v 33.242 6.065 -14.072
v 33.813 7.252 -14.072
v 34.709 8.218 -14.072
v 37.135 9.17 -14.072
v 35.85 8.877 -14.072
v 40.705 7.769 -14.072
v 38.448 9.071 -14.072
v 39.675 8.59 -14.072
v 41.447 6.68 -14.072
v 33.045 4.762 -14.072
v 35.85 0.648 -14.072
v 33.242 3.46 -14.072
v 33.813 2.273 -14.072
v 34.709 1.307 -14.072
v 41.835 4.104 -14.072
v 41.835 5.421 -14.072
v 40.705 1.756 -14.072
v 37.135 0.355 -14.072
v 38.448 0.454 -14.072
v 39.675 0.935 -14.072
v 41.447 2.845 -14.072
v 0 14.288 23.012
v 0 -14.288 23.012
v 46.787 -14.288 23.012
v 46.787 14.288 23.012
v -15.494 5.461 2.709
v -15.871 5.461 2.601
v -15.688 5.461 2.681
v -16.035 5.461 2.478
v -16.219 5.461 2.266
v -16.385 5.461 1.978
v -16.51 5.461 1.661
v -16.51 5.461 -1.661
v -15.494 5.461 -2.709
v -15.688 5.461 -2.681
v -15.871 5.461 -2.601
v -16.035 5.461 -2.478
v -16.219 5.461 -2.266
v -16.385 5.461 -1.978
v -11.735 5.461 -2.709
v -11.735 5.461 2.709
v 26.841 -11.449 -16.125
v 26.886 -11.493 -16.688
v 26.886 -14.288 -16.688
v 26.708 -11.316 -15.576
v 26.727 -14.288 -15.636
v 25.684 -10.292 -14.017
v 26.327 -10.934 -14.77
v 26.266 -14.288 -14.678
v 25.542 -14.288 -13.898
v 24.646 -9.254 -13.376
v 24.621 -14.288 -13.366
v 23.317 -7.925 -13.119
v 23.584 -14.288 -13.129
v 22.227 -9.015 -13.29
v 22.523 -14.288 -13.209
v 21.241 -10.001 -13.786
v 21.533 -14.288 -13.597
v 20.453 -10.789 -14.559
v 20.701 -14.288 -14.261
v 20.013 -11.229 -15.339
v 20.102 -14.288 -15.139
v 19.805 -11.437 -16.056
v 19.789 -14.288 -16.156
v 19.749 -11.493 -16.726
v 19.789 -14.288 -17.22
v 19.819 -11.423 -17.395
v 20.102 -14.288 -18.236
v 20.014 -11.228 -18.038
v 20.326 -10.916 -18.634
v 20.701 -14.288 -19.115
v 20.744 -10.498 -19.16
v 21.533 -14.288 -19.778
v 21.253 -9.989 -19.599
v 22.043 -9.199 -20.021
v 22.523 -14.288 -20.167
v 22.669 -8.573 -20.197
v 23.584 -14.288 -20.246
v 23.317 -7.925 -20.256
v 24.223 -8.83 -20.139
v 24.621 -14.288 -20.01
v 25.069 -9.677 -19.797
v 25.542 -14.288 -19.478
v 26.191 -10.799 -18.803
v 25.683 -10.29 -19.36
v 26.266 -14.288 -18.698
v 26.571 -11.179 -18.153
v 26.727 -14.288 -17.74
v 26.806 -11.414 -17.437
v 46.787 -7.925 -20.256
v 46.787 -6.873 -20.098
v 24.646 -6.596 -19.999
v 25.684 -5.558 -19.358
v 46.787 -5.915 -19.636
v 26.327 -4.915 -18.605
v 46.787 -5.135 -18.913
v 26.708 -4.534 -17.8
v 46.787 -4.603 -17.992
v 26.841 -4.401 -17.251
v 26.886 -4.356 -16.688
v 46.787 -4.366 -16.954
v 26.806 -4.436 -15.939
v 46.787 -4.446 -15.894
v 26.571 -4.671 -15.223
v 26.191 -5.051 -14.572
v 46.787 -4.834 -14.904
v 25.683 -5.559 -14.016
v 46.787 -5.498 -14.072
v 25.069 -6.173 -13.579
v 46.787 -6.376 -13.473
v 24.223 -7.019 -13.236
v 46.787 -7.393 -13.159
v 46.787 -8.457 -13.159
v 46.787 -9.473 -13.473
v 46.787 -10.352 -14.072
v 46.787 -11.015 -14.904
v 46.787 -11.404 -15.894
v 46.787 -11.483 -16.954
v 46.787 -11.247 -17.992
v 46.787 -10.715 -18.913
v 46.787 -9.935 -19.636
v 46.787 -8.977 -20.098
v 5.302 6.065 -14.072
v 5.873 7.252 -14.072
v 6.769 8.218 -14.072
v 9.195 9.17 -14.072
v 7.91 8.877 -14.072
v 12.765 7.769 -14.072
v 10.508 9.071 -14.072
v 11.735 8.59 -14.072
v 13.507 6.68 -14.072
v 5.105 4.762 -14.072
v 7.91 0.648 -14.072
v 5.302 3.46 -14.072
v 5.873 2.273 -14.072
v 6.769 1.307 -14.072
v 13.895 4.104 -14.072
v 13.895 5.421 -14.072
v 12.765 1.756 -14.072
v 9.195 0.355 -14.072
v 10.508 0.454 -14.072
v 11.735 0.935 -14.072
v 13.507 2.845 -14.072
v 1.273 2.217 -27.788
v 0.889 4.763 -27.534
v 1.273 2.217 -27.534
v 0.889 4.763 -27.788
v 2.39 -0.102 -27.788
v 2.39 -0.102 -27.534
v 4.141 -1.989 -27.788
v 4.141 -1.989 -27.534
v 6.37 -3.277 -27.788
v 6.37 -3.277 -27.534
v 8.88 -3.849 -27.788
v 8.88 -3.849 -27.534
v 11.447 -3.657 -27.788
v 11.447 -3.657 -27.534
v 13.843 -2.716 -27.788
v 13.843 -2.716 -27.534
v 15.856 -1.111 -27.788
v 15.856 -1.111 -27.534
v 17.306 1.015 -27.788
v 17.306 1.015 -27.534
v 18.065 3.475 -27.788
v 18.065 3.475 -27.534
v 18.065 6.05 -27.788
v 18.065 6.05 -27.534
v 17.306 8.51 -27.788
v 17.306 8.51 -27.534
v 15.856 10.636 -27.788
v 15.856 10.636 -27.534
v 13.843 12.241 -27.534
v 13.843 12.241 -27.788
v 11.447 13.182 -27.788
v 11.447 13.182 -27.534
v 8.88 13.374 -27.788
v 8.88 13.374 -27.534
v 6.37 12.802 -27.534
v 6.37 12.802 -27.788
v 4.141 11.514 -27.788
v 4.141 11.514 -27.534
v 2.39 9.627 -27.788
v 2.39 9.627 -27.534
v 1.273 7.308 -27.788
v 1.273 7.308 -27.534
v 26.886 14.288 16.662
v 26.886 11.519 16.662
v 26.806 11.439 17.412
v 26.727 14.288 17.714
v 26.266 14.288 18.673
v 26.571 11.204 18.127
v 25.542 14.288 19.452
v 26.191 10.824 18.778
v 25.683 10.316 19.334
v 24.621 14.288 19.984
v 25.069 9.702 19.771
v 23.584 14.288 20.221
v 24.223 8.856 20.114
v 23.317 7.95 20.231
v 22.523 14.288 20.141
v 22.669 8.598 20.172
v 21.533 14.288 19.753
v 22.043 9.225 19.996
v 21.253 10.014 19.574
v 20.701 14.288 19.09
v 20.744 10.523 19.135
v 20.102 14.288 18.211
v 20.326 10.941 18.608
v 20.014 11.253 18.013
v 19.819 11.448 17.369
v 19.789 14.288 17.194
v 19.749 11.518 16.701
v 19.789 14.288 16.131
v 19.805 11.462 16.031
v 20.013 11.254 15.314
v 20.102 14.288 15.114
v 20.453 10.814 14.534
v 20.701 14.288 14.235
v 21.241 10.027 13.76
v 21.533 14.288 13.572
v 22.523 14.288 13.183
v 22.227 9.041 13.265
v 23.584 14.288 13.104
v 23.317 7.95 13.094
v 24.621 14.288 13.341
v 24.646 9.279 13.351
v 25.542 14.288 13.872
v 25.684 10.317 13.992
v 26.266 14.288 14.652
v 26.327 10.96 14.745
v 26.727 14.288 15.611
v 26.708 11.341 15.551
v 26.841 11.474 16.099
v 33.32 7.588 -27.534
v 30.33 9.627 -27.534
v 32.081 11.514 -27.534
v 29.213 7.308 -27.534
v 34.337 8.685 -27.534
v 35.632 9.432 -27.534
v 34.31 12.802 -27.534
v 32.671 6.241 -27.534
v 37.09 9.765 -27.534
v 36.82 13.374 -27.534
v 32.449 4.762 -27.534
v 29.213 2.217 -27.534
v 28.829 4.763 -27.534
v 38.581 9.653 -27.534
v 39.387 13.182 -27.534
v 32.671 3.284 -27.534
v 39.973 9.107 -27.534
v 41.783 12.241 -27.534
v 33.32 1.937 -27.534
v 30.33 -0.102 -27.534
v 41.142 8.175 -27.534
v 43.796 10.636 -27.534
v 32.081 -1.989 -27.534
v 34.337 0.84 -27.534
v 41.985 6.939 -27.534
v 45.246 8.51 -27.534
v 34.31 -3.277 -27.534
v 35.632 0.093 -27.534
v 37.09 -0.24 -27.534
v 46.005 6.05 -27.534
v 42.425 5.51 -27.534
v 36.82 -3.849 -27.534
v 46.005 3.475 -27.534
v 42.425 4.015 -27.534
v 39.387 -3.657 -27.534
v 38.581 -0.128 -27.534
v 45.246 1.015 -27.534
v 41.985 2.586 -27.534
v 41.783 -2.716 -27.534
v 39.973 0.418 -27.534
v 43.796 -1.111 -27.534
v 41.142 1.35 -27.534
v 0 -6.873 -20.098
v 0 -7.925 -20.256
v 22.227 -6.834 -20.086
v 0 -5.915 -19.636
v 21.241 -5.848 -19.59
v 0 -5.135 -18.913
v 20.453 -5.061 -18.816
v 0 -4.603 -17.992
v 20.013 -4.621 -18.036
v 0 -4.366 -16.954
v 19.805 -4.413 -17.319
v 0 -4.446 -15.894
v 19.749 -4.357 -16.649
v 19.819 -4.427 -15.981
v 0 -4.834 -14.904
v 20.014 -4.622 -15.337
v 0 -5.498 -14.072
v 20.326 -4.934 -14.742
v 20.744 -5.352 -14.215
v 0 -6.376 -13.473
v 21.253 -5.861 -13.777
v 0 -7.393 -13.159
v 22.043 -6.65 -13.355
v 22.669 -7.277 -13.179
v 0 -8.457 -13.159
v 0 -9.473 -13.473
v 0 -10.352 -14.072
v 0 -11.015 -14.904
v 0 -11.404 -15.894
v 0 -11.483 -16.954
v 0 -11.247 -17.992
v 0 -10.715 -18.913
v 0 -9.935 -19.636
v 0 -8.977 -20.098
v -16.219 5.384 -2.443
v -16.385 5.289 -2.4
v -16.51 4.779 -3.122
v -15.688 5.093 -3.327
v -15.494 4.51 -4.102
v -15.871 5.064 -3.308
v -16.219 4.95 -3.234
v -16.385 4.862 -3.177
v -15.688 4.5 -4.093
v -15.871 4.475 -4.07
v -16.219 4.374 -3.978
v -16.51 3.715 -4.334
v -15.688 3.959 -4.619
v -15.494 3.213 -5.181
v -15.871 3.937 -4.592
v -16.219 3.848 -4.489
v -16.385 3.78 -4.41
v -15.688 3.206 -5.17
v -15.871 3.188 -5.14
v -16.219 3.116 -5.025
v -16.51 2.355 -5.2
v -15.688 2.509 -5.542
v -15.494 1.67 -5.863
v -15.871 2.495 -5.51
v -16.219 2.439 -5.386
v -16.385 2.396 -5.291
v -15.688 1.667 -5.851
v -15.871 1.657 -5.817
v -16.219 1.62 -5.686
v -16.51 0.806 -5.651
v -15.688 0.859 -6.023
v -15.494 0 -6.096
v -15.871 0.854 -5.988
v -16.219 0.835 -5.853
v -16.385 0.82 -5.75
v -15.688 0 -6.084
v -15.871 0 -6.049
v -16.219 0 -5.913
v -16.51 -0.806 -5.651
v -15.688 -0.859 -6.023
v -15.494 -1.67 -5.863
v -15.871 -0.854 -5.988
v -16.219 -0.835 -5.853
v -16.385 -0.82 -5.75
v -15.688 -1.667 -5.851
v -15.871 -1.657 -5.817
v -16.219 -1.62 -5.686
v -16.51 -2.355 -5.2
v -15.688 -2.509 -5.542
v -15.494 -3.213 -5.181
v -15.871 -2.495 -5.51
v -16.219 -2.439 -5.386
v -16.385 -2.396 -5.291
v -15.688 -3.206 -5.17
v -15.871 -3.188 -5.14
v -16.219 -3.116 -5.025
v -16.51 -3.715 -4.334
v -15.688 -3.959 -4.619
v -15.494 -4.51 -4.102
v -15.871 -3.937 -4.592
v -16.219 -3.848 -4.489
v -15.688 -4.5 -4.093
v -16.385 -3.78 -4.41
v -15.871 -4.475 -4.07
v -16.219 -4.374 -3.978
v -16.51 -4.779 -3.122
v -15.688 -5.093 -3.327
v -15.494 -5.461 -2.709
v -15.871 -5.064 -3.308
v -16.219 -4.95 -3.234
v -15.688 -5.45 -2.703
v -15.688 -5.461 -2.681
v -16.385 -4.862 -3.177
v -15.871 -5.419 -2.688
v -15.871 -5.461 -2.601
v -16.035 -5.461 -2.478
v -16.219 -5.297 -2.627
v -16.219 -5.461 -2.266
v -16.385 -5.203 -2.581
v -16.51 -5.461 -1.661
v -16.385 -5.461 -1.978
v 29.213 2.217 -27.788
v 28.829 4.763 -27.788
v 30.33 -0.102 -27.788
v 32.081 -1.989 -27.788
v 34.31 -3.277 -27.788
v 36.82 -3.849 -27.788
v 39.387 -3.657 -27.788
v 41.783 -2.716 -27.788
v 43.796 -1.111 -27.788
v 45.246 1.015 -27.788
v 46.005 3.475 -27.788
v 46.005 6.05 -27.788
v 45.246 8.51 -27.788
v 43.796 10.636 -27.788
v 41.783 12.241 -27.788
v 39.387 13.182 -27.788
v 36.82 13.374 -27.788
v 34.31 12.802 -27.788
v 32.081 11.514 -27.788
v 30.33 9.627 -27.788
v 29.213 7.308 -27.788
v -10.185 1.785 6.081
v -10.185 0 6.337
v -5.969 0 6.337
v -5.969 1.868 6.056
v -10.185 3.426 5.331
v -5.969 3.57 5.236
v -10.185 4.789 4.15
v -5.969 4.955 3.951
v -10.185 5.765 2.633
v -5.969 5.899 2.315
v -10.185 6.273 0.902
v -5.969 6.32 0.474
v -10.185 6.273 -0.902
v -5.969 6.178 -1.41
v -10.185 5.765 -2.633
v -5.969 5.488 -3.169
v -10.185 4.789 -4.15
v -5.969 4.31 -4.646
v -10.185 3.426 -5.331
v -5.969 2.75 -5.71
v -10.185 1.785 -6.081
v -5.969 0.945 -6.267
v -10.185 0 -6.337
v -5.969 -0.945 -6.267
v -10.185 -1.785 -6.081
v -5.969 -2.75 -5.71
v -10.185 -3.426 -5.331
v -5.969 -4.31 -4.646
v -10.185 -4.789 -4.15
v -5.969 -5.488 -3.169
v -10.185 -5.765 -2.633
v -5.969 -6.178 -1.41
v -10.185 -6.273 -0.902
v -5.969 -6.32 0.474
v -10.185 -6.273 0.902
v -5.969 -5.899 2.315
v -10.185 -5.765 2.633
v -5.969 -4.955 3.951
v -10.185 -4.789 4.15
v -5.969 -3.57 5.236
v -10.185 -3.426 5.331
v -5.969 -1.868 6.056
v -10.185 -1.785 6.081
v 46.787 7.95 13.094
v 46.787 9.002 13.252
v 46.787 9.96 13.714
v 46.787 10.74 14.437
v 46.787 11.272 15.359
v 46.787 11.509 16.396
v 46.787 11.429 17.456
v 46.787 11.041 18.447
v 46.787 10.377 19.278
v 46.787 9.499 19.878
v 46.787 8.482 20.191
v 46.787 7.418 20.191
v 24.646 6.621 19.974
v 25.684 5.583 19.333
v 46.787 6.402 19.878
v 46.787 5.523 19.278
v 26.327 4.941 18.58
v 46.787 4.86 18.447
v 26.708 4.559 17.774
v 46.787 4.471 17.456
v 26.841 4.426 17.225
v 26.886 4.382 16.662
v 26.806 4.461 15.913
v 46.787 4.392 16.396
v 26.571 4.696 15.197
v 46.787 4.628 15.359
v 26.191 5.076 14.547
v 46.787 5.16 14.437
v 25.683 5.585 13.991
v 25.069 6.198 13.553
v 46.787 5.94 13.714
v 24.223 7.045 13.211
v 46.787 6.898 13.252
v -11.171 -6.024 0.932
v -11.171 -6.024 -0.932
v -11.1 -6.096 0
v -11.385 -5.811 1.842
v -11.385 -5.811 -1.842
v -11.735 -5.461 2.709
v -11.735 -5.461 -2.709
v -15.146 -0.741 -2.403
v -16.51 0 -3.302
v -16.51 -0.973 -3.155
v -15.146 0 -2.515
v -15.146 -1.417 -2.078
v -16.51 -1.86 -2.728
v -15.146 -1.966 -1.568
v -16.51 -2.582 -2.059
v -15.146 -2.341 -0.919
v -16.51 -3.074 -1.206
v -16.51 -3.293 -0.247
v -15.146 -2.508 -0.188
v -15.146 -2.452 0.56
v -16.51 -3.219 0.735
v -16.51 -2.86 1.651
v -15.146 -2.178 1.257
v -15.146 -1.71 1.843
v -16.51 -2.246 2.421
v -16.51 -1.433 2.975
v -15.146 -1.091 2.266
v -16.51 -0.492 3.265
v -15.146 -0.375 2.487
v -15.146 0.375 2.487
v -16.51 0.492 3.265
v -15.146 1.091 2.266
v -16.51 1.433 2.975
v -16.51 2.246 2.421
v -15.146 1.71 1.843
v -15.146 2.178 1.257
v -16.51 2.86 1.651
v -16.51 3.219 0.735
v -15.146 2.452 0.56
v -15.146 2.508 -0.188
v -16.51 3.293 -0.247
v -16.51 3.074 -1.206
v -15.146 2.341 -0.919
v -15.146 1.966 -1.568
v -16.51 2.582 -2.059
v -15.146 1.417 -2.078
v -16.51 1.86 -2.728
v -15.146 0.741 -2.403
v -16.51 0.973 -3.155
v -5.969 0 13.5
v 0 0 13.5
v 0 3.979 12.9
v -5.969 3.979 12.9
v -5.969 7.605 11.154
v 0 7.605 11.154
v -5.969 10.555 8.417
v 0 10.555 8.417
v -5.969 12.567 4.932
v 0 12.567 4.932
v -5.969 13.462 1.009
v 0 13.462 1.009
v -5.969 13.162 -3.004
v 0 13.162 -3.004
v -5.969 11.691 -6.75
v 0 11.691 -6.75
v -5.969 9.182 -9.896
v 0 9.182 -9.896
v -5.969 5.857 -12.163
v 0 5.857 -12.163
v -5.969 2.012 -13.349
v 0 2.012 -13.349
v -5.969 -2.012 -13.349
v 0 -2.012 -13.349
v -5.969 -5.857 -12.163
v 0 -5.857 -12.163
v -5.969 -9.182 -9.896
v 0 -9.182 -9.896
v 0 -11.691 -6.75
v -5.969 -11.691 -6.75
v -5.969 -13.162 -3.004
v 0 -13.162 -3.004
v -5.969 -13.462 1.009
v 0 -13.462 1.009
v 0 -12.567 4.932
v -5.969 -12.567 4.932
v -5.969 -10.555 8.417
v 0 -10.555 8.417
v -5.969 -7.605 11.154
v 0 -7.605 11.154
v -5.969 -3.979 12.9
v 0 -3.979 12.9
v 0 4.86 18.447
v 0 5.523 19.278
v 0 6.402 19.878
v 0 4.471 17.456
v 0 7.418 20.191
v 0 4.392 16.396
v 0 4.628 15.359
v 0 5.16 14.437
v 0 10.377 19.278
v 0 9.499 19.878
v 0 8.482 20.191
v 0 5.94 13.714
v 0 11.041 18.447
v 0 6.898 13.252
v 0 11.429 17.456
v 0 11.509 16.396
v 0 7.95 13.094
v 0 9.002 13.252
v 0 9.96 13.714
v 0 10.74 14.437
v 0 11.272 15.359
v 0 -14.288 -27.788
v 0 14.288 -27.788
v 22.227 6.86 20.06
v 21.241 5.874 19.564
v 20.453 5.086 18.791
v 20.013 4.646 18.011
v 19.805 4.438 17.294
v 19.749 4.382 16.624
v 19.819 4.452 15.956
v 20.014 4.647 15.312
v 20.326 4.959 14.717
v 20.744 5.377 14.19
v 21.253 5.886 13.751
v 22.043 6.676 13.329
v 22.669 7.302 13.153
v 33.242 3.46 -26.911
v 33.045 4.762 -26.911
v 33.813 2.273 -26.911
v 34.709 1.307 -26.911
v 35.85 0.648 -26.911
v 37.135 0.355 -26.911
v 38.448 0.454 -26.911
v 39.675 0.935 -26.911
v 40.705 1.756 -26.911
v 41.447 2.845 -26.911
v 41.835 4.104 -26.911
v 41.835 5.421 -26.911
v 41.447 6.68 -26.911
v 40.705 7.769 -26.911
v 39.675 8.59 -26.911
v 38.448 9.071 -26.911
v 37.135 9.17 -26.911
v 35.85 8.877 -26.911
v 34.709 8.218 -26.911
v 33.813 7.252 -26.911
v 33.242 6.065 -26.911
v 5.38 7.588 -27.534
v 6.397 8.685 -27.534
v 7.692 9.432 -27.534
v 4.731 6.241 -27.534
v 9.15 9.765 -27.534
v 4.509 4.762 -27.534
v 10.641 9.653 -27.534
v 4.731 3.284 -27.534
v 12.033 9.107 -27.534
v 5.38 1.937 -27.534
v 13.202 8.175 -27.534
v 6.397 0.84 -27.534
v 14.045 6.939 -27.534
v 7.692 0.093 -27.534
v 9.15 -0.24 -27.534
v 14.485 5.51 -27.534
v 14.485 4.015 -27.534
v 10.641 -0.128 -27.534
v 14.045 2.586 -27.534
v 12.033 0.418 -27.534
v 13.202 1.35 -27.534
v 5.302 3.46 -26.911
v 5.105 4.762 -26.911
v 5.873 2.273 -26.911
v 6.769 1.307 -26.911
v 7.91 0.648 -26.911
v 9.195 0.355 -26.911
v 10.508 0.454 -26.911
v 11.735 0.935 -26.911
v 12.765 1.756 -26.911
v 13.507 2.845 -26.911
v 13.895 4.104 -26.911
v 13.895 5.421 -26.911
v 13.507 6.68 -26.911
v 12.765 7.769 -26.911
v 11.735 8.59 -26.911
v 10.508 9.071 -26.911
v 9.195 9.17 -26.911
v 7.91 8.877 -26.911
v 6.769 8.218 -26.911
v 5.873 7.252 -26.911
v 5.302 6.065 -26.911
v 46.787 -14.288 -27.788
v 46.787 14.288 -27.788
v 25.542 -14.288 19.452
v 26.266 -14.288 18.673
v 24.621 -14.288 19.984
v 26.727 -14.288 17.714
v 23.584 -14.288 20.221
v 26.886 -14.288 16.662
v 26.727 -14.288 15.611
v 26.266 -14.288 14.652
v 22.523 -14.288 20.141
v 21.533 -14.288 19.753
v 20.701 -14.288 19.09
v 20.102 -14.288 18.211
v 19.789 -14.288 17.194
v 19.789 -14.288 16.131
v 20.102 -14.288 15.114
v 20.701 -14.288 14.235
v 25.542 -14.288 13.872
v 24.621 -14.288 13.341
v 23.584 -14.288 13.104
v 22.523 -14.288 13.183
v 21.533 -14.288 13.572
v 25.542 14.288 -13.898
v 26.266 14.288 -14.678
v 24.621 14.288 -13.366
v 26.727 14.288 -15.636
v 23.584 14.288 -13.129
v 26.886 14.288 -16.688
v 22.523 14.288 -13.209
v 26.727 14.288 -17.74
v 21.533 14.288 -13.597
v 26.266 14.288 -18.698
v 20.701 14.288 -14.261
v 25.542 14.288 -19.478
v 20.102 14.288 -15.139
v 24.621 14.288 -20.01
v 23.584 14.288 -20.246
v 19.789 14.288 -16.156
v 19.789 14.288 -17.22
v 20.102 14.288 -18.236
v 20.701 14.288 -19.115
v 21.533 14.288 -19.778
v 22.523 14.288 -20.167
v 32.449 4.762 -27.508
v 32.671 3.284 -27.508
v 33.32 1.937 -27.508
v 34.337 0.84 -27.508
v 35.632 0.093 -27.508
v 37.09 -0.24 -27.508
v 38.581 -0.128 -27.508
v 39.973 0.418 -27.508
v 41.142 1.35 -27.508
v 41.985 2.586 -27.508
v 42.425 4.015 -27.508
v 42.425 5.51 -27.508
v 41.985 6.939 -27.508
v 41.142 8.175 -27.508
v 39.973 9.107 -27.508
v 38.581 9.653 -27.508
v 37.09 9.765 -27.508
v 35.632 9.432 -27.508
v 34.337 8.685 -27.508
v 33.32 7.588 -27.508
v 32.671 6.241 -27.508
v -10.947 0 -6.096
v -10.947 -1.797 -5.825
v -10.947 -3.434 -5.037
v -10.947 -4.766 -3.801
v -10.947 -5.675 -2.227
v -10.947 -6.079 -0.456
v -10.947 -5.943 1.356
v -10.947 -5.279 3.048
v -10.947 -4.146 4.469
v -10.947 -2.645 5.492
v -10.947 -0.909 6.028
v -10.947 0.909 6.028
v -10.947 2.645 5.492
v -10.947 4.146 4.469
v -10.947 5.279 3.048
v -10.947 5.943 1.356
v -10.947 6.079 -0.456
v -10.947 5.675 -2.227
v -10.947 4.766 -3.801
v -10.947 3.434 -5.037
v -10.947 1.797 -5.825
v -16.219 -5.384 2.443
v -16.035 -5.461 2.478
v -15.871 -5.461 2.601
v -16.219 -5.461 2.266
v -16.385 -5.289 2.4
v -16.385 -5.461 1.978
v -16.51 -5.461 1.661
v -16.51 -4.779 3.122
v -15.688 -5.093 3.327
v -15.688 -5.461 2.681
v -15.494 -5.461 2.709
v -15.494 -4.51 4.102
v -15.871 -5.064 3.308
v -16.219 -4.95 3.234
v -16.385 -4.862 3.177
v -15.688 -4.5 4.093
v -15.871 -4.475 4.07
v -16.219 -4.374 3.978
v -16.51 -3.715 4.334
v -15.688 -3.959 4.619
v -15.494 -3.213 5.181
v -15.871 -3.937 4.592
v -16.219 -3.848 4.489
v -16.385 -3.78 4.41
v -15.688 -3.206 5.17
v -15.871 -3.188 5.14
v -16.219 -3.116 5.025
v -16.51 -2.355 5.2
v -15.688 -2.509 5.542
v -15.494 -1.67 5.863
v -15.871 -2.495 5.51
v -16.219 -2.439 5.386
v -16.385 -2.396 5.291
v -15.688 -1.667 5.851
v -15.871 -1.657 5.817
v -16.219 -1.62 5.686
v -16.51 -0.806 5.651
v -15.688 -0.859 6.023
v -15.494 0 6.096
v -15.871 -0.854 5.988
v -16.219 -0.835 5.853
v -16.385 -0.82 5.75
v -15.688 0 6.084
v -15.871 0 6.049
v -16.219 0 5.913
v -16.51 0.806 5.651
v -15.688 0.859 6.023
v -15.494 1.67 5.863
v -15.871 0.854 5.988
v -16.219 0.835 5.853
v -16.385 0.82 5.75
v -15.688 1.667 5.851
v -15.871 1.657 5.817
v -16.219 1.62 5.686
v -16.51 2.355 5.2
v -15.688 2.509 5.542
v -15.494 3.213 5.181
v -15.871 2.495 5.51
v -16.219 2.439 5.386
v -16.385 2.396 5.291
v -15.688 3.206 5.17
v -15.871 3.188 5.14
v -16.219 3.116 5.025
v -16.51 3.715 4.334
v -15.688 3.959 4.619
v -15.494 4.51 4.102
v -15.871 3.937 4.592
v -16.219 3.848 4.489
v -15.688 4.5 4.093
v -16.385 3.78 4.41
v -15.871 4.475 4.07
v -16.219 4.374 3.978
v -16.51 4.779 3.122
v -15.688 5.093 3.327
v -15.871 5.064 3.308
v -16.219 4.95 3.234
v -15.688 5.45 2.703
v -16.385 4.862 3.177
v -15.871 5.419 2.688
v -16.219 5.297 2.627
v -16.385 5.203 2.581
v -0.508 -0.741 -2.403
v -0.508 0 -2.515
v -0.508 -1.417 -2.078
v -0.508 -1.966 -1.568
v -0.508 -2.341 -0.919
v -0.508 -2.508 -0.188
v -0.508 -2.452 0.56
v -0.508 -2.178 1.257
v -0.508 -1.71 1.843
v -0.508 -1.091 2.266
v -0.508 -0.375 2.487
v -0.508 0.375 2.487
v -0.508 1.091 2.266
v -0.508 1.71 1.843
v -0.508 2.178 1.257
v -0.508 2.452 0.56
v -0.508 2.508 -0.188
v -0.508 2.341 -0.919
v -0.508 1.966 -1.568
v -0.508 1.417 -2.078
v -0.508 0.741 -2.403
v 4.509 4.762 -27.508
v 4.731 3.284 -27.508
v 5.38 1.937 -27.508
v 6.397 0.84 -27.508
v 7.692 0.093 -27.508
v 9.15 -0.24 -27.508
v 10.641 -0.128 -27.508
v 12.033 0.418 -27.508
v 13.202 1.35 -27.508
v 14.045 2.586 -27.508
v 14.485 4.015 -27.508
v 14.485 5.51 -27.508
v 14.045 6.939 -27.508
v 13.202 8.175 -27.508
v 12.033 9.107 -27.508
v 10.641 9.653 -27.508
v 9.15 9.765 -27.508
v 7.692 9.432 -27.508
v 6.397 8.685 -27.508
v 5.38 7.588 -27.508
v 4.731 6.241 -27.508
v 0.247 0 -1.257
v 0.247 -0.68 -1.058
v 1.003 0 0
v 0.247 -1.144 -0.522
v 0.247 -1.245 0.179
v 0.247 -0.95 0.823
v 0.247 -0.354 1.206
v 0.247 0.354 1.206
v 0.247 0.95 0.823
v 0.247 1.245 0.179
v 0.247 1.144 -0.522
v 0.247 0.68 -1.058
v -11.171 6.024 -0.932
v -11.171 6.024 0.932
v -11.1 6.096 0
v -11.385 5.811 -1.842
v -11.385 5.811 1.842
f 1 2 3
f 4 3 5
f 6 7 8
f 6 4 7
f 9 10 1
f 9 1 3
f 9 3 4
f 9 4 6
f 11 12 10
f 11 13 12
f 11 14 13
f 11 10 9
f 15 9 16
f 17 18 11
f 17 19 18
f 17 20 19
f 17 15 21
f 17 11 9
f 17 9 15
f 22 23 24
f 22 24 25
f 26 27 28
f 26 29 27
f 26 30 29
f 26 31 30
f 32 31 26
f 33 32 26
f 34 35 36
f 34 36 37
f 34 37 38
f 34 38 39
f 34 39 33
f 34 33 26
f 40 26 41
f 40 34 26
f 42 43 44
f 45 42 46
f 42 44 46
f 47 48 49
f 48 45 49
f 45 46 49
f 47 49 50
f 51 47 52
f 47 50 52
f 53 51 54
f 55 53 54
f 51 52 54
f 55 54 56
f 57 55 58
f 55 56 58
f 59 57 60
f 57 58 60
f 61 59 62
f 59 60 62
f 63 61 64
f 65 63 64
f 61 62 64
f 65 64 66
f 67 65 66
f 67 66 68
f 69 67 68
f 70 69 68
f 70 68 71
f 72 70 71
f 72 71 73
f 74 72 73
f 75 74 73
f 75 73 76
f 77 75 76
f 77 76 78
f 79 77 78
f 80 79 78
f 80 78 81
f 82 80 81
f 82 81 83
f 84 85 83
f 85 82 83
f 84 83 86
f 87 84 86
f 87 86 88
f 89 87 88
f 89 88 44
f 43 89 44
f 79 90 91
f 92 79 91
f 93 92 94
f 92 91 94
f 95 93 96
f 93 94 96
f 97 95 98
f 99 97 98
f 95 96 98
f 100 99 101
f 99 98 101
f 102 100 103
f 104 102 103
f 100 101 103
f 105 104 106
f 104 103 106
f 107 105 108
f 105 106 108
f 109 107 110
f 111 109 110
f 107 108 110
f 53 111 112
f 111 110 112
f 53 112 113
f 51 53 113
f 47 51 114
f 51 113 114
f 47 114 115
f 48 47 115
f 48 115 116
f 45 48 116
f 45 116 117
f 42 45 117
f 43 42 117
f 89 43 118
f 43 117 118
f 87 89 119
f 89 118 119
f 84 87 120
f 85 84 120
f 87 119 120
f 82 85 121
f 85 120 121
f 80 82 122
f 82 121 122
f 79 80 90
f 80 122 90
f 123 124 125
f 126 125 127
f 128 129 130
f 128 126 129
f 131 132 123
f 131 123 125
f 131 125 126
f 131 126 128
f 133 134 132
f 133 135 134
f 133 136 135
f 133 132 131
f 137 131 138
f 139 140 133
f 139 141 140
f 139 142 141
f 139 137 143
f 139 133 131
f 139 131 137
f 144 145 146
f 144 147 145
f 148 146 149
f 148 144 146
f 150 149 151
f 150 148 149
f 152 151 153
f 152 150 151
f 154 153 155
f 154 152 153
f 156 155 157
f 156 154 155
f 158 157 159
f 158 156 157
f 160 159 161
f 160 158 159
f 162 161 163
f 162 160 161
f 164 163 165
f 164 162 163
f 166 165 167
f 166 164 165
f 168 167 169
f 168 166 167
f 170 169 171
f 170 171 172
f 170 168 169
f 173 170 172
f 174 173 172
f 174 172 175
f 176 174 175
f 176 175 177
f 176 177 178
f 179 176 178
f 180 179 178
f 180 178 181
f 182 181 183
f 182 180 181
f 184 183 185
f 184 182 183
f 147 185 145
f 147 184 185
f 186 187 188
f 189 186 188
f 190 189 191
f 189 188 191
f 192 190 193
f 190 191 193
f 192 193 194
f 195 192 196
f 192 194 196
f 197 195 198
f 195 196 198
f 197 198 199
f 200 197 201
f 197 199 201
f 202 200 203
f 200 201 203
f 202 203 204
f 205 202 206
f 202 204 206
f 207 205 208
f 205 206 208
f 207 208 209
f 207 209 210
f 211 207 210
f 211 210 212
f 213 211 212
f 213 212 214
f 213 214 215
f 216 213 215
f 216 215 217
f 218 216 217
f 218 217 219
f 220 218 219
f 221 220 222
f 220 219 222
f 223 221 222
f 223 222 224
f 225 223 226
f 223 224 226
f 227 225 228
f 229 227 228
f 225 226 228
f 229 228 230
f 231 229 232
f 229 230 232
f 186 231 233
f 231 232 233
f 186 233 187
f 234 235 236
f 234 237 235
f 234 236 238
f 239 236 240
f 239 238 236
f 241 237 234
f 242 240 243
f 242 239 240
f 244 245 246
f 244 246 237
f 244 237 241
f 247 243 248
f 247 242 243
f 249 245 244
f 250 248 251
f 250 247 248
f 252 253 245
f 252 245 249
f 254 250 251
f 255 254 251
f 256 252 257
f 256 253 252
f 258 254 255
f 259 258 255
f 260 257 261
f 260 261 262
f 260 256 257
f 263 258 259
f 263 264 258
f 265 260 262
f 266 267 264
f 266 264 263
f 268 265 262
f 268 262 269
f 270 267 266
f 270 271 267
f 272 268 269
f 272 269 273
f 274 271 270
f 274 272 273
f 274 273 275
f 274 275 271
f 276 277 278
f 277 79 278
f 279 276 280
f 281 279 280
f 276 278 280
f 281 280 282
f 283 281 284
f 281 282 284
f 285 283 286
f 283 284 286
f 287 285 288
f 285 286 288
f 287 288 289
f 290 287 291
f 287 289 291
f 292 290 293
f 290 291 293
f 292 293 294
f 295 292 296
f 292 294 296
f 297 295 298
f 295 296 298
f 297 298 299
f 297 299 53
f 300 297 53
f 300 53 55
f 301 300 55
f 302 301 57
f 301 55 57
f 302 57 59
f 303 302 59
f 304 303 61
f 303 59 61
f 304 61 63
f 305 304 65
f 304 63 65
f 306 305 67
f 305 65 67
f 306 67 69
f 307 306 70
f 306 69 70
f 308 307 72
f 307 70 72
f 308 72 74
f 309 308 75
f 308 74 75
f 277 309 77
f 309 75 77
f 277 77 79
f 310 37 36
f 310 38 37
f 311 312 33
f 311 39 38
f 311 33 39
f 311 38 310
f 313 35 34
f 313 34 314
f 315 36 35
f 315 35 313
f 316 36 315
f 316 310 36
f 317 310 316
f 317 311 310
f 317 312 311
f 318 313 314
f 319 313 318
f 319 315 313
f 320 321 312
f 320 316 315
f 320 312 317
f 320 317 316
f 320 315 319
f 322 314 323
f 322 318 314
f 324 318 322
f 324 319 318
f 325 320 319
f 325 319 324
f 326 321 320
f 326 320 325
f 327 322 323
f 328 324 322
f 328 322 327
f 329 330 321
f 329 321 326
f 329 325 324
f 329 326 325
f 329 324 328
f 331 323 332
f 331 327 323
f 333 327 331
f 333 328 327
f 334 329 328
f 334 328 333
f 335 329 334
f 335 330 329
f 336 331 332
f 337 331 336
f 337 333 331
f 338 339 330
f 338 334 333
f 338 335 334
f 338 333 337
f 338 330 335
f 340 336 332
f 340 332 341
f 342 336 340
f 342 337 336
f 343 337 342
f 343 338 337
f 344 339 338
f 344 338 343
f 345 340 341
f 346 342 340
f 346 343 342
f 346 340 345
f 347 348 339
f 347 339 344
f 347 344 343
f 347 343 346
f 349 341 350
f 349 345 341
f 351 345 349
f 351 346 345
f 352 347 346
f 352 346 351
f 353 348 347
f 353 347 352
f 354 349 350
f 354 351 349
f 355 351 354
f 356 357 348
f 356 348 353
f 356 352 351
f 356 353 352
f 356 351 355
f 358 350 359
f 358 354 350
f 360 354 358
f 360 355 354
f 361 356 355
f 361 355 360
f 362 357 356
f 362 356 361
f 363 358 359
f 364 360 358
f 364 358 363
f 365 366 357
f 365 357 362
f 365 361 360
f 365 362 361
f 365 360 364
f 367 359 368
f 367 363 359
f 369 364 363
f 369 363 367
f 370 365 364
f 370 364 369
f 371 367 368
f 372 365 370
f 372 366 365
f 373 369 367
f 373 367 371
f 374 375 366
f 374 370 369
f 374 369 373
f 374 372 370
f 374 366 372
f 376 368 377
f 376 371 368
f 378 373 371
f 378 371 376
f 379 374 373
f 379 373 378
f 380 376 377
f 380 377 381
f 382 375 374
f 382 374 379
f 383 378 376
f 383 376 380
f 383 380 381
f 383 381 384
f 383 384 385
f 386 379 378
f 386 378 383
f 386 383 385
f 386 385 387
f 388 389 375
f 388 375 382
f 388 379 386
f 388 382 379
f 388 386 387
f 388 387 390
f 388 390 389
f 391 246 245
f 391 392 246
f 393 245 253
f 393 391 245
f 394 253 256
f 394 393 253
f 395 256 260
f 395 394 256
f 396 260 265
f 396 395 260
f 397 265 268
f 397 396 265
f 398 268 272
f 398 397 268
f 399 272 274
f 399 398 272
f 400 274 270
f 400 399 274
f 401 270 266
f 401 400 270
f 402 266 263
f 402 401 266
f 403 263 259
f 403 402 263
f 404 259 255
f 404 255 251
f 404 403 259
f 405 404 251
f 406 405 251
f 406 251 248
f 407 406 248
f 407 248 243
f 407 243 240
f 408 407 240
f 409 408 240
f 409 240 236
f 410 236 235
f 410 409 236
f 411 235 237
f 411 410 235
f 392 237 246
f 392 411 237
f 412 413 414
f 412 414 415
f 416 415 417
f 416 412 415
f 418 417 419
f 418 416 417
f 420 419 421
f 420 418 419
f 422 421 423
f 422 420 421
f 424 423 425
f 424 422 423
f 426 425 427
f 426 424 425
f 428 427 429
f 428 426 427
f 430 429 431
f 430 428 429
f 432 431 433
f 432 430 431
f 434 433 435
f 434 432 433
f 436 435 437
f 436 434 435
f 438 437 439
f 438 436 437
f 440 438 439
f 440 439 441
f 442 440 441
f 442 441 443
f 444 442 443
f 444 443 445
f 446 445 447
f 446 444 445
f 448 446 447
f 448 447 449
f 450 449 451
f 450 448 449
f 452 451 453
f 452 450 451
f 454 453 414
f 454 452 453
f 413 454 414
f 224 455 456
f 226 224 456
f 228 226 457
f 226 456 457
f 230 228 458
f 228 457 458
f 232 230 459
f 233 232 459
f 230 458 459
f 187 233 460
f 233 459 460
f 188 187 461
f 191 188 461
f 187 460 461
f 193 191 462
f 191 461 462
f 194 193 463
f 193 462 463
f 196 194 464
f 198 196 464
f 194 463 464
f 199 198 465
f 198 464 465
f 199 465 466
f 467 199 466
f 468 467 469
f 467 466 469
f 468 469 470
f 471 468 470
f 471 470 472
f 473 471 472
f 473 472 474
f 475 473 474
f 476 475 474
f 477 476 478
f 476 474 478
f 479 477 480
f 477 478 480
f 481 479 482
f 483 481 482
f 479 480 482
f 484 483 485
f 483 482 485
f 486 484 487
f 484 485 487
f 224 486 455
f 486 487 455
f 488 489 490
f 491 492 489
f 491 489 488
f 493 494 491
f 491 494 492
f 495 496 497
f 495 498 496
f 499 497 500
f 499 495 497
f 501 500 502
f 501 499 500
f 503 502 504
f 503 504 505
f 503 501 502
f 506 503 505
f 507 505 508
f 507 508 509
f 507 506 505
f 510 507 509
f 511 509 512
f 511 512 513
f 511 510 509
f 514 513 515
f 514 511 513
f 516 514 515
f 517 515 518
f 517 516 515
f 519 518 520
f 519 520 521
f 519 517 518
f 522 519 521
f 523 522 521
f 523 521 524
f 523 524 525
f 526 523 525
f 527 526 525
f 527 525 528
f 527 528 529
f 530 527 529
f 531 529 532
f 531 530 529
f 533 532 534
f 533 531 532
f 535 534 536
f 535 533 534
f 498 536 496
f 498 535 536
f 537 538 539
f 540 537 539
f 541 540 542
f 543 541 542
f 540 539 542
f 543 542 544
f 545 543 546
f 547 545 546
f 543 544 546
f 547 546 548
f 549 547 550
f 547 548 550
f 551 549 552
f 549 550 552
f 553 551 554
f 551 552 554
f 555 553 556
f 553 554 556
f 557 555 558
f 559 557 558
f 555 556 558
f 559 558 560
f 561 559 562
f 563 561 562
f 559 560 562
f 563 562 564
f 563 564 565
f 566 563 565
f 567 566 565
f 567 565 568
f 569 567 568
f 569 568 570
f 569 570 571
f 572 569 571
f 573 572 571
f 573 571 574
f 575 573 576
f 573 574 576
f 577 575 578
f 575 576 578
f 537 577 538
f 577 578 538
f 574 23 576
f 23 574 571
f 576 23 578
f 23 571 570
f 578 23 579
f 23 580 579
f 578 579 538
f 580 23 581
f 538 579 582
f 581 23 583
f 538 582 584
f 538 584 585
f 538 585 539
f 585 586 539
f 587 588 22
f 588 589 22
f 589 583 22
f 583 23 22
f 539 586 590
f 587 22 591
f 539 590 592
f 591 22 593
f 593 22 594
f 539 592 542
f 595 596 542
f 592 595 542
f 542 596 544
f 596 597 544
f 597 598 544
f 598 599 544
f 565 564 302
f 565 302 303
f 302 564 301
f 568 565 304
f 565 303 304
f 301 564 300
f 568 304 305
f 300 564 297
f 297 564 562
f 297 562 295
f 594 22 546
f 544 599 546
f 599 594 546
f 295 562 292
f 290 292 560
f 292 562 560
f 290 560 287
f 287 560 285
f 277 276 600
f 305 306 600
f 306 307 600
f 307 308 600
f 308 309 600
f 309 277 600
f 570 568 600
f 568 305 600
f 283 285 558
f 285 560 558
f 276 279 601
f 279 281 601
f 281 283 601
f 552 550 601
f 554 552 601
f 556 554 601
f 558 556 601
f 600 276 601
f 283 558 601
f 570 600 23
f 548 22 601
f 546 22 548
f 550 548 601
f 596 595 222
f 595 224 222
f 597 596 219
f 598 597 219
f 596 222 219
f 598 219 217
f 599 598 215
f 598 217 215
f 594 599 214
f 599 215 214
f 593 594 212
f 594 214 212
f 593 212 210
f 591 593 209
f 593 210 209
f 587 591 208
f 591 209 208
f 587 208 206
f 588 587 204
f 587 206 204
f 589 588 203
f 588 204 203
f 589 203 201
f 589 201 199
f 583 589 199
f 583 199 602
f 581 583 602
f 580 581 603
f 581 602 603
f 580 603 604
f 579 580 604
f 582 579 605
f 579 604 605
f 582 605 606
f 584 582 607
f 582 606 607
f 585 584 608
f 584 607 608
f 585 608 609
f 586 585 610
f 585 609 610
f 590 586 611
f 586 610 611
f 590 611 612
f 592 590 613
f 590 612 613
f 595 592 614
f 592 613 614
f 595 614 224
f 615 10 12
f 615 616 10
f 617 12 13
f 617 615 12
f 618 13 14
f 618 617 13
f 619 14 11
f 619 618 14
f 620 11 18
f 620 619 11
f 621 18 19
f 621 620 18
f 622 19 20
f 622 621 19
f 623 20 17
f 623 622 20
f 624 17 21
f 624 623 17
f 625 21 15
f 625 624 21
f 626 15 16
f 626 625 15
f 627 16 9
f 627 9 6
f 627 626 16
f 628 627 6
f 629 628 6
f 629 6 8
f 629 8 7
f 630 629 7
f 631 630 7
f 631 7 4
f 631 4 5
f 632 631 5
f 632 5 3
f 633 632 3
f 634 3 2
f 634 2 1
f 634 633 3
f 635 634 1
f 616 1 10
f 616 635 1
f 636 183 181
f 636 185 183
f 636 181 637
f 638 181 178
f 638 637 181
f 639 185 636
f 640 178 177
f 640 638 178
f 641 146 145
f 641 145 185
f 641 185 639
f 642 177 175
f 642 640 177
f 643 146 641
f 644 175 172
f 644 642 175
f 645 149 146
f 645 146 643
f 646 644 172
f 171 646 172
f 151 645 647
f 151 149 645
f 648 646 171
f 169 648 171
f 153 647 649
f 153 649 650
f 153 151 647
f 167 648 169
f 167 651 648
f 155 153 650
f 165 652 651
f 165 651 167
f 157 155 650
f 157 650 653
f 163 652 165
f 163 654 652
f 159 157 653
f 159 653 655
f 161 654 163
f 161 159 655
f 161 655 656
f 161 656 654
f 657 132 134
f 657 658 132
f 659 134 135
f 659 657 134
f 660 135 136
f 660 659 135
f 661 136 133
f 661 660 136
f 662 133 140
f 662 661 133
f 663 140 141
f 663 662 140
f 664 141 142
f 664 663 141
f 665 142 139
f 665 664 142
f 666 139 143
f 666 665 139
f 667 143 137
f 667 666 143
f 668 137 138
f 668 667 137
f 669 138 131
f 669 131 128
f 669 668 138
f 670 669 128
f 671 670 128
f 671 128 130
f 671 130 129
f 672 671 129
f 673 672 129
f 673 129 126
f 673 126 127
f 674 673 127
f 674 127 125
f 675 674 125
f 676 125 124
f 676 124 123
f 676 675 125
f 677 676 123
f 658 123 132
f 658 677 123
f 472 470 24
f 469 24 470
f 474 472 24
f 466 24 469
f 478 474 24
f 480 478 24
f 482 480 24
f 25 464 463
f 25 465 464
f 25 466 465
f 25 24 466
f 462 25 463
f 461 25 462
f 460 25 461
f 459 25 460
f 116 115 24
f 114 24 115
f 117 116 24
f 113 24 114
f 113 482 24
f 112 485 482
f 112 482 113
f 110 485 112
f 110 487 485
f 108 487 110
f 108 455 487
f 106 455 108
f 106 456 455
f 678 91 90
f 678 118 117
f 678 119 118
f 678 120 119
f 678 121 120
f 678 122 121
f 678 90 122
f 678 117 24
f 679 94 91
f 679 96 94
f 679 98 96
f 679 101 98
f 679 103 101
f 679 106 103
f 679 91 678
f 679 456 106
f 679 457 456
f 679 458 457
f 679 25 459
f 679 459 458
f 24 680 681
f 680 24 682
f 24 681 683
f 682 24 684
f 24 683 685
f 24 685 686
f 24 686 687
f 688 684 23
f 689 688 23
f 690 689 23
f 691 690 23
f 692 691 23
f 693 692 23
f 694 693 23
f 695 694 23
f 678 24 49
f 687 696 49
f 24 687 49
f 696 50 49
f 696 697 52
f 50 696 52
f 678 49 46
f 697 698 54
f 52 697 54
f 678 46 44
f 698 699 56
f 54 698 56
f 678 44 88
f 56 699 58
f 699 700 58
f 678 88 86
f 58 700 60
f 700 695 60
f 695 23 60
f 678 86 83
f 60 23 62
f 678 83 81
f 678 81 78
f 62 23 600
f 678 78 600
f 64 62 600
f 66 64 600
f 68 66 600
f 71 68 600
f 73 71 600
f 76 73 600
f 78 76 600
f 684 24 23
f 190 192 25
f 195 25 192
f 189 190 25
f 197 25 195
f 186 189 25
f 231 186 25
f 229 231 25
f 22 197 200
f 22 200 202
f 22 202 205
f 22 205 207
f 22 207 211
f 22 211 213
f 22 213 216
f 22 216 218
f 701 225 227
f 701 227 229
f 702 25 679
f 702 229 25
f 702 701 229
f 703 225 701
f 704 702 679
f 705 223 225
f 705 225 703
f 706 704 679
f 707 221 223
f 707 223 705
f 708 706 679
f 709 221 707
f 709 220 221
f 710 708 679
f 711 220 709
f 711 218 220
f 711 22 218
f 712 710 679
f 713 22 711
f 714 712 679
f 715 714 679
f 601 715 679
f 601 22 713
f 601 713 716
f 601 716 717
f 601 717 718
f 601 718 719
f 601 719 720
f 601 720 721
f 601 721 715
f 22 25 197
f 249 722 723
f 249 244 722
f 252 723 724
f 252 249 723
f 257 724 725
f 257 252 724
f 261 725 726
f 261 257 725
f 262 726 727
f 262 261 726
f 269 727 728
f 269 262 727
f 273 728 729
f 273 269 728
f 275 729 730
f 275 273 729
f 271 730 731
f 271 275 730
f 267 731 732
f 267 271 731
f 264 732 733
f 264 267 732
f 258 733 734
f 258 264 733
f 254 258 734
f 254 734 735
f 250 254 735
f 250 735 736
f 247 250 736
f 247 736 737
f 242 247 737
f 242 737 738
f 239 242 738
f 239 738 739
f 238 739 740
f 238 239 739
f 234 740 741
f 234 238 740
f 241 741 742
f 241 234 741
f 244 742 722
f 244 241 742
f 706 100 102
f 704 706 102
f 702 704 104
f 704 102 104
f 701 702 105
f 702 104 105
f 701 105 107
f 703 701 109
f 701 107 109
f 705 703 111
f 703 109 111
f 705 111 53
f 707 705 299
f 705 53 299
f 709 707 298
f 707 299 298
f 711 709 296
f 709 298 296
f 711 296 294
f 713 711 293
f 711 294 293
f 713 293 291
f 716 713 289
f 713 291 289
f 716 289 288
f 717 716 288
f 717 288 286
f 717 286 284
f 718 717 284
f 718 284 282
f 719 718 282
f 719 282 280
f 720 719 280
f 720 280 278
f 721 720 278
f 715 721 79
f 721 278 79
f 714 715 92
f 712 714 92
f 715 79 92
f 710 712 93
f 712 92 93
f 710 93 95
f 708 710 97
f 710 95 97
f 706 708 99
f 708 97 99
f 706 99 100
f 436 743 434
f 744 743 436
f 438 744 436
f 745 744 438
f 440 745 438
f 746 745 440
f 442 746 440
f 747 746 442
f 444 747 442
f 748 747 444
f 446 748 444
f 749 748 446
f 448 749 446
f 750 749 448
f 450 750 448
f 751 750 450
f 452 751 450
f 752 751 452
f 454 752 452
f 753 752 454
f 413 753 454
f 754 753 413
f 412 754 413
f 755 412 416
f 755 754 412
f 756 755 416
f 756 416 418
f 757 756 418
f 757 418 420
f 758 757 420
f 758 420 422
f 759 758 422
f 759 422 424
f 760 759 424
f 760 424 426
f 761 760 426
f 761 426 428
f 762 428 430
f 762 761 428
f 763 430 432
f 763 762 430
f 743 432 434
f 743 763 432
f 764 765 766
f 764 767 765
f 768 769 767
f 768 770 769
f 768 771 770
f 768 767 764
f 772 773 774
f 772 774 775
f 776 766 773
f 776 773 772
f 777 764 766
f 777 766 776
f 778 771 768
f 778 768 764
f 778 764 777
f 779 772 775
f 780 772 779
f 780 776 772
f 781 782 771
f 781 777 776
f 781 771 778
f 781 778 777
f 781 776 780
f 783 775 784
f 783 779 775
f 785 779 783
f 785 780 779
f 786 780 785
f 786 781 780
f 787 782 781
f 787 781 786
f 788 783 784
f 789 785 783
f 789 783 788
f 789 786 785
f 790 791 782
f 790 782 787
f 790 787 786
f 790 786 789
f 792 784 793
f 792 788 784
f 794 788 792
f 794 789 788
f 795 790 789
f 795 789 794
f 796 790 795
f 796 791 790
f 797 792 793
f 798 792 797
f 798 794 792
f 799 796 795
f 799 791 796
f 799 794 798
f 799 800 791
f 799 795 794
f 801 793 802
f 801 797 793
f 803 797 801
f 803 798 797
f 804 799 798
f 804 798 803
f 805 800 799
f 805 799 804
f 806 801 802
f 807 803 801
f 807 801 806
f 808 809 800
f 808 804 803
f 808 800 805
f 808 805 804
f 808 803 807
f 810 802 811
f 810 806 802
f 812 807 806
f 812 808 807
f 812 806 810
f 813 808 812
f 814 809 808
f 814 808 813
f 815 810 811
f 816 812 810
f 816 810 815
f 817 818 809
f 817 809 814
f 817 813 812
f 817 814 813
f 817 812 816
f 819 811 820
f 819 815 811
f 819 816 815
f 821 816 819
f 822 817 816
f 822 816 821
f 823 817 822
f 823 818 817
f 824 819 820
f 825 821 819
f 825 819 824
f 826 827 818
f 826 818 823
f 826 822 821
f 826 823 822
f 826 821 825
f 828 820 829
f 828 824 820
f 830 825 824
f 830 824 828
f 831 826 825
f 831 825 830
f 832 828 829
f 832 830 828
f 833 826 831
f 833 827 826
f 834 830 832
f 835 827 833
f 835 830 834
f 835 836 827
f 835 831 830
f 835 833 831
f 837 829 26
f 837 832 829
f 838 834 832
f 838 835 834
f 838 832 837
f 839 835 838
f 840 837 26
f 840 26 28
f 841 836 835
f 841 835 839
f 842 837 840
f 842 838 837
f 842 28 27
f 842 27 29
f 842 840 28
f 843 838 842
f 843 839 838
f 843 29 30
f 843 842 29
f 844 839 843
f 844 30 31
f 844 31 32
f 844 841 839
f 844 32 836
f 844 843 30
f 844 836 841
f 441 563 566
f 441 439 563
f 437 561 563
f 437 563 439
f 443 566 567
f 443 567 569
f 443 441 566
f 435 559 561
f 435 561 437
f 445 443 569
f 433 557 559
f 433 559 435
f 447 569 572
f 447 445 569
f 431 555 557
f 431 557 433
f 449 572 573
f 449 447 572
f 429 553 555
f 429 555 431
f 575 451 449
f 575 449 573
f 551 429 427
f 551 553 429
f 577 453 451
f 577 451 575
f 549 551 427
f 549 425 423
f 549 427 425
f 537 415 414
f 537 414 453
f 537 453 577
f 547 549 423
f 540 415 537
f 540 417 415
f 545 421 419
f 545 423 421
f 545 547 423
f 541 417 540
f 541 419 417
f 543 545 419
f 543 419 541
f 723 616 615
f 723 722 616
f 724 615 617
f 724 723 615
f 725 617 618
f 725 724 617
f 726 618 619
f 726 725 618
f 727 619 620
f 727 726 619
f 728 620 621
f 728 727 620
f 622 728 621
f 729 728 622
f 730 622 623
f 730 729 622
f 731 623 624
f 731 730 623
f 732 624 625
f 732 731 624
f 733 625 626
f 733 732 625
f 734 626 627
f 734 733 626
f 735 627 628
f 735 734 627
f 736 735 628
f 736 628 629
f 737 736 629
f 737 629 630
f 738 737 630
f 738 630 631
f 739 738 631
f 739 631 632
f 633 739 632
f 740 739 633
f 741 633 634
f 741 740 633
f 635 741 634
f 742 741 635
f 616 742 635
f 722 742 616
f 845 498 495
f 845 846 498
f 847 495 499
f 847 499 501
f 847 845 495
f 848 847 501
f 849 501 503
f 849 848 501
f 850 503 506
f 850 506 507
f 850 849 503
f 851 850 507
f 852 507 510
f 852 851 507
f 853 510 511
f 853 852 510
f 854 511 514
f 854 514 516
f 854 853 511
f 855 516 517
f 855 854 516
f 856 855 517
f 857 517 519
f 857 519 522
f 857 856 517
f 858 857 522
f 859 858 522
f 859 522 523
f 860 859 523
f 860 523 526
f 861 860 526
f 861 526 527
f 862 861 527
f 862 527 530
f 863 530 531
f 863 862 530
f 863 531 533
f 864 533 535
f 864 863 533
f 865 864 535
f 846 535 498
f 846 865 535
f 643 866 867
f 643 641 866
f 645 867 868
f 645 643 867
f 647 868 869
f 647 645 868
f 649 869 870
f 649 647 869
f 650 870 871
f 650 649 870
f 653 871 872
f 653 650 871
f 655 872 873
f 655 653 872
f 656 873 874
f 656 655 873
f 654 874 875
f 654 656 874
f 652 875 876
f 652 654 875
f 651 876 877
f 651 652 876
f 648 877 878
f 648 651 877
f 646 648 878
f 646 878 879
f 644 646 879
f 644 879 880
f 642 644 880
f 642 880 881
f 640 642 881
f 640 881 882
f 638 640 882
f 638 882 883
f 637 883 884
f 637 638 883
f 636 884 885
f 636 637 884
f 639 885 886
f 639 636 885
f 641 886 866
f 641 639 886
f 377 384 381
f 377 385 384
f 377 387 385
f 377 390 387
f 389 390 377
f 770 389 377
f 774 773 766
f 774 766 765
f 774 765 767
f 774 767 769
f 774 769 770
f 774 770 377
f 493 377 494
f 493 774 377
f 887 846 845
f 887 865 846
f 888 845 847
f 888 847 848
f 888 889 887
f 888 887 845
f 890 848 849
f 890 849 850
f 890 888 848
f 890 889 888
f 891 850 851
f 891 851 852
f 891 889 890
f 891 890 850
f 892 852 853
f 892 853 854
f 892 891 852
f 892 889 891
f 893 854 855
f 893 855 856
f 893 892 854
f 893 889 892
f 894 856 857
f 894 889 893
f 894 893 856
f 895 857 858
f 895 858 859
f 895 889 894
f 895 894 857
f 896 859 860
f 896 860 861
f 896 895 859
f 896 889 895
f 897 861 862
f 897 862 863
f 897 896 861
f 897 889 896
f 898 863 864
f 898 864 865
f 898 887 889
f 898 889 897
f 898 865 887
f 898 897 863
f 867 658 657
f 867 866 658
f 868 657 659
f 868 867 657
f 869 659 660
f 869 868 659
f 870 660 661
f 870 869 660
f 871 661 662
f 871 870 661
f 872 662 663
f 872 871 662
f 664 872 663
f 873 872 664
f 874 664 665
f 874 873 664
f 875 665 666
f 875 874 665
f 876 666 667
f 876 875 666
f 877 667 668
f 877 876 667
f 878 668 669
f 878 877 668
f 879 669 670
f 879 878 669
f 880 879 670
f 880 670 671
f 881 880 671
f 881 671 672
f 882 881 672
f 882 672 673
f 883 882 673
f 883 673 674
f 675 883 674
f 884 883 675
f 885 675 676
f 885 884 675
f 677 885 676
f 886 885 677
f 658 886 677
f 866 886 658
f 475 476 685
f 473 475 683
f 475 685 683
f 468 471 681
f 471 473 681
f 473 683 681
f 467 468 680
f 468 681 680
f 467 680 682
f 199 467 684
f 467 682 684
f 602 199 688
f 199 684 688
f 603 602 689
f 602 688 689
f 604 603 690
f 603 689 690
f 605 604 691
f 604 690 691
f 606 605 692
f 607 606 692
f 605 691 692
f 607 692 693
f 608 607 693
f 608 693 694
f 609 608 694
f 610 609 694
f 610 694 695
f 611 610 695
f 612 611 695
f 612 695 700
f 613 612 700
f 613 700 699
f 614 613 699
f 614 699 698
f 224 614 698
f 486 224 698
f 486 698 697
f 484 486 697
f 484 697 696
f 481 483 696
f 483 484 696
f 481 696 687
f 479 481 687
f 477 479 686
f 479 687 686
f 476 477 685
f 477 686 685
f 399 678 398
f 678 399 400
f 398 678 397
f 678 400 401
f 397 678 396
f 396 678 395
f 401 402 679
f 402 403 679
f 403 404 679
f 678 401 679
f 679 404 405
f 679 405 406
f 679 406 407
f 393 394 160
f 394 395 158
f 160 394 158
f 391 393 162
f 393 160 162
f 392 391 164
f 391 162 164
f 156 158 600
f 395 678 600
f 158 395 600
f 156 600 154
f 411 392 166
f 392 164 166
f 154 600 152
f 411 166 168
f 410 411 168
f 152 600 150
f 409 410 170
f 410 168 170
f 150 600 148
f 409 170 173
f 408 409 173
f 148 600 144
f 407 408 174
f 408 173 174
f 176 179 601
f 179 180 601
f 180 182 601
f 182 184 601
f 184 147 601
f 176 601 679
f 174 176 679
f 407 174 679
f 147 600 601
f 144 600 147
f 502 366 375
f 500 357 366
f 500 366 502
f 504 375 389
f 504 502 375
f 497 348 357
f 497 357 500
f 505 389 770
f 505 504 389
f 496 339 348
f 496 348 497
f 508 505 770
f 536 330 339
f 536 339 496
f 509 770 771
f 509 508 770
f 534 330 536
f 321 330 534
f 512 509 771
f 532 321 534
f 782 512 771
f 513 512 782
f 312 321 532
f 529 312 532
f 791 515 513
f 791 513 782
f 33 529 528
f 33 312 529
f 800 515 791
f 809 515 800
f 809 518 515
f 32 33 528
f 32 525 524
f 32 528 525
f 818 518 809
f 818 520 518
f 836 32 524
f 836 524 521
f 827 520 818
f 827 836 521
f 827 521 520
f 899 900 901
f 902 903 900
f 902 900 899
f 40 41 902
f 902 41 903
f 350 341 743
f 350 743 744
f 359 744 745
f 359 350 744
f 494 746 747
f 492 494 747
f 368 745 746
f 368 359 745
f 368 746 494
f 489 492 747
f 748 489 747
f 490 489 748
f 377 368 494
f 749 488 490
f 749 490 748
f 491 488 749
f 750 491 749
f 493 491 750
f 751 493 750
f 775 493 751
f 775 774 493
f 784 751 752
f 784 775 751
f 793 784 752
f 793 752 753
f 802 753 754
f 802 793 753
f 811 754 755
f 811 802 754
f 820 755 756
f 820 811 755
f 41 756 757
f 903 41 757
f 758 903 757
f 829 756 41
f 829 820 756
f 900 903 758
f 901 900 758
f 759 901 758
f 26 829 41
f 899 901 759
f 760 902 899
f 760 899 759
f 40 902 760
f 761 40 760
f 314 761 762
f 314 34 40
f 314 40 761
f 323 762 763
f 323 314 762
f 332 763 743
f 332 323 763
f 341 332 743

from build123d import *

# Parameters (mm, degrees)
SKETCH1_W          = 50.8
SKETCH1_H          = 28.575
EXTRUDE1_DEPTH     = 46.7868
LPATTERN1_COUNT    = 2
LPATTERN1_PITCH    = 27.94
SKETCH5_R          = 13.5001
EXTRUDE2_DEPTH     = 5.969
SKETCH6_W          = 6.3373
SKETCH6_H          = 10.541
CUT_EXTRUDE4_DEPTH = 30.48
HOLE1_D            = 7.137
HOLE1_DEPTH        = 46.7868
HOLE2_D            = 7.137
HOLE2_DEPTH        = 28.575


with BuildPart() as part:
    # Sketch1 → Extrude1 (new body)
    with BuildSketch(Plane(origin=(0, 0, 0), x_dir=(0, 0, -1), z_dir=(1, 0, 0))):
        with Locations((2.3876, 0)):
            Rectangle(SKETCH1_W, SKETCH1_H)
    extrude(amount=EXTRUDE1_DEPTH)

    # S2D0002 → Cut-Revolve1 (revolve, cut)
    with BuildSketch(Plane(origin=(0, 4.7625, 0), x_dir=(-1, 0, 0), z_dir=(0, 1, 0)), mode=Mode.PRIVATE) as cut_revolve1_sk:
        Polygon((-14.5415, -27.5336), (-18.161, -27.5336), (-18.161, -27.7876), (-9.525, -27.7876), (-9.525, -14.0716), (-13.9446, -14.0716), (-13.9446, -26.9113), (-14.5415, -27.5082), align=None)
    cut_revolve1 = revolve(cut_revolve1_sk.sketch.rotate(Axis((9.525, 4.7625, -19.13842003), (0, 0, 1)), 180), axis=Axis((9.525, 4.7625, -19.13842003), (0, 0, 1)), mode=Mode.SUBTRACT)  # turned: the seam where the file's is

    # LPattern1: Cut-Revolve1 ×2
    with Locations(*[(i * LPATTERN1_PITCH, 0, 0) for i in range(1, LPATTERN1_COUNT)]):
        add(cut_revolve1, mode=Mode.SUBTRACT)

    # Sketch5 → Extrude2 (add)
    with BuildSketch(Plane.ZY):
        Circle(SKETCH5_R)
    extrude(amount=EXTRUDE2_DEPTH)

    # Sketch6 → Revolve1 (revolve)
    with BuildSketch(Plane(origin=(0, 0, 0), x_dir=(0, 0, 1), z_dir=(0, -1, 0)), mode=Mode.PRIVATE) as revolve1_sk:
        with Locations((-3.16865, 11.2395)):
            Rectangle(SKETCH6_W, SKETCH6_H)
    revolve(revolve1_sk.sketch.rotate(Axis((5.754582971, 0, 0), (-1, 0, 0)), 180), axis=Axis((5.754582971, 0, 0), (-1, 0, 0)))  # turned: the seam where the file's is

    # S2D0001 → Cut-Revolve4 (revolve, cut)
    with BuildSketch(Plane(origin=(-18.511260017, 3.2639, 0), x_dir=(0, 1, 0), z_dir=(0, 0, 1)), mode=Mode.PRIVATE) as cut_revolve4_sk:
        Polygon((-0.7493, -3.365076823), (-0.7493, -18.003260017), (-3.2639, -19.51418413), (-3.2639, -2.001260017), (0.0381, -2.001260017), align=None)
    revolve(cut_revolve4_sk.sketch.rotate(Axis((0, 0, 0), (-1, 0, 0)), 90), axis=Axis((0, 0, 0), (-1, 0, 0)), mode=Mode.SUBTRACT)  # turned: the seam where the file's is

    # Sketch8 → Cut-Revolve5 (revolve, cut)
    with BuildSketch(Plane(origin=(0, 0, 0), x_dir=(0, 0, -1), z_dir=(0, 1, 0)), mode=Mode.PRIVATE) as cut_revolve5_sk:
        with BuildLine():
            Line((-6.3373, 10.1854), (-6.096, 10.9474))
            Line((-6.096, 10.9474), (-6.096, 15.494))
            ThreePointArc((-6.096, 15.494), (-5.995678675, 16.037796865), (-5.707922533, 16.51))
            Line((-5.707922533, 16.51), (-6.3373, 16.51))
            Line((-6.3373, 16.51), (-6.3373, 10.1854))
        make_face()
    revolve(cut_revolve5_sk.sketch.rotate(Axis((-12.65936, 0, 0), (-1, 0, 0)), 180), axis=Axis((-12.65936, 0, 0), (-1, 0, 0)), mode=Mode.SUBTRACT)  # turned: the seam where the file's is

    # Sketch12 → Cut-Extrude4 (cut, symmetric)
    with BuildSketch(Plane(origin=(0, 0, 0), x_dir=(0, -1, 0), z_dir=(0, 0, -1))):
        Polygon((5.461, 16.51), (5.461, 11.7348), (6.096, 11.0998), (6.096, 16.51), align=None)
        Polygon((-5.461, 16.51), (-5.461, 11.7348), (-6.096, 11.0998), (-6.096, 16.51), align=None)
    extrude(amount=CUT_EXTRUDE4_DEPTH, both=True, mode=Mode.SUBTRACT)

    # Hole1
    with Locations(Plane.ZY):
        with Locations((-16.6878, -7.9248), (16.6624, 7.9502)):
            Hole(HOLE1_D / 2, depth=HOLE1_DEPTH)

    # Hole2
    with Locations(Plane(origin=(0, 14.2875, 0), x_dir=(-1, 0, 0), z_dir=(0, 1, 0))):
        with Locations((-23.3172, -16.6878), (-23.3172, 16.6624)):
            Hole(HOLE2_D / 2, depth=HOLE2_DEPTH)


solid = part.part
